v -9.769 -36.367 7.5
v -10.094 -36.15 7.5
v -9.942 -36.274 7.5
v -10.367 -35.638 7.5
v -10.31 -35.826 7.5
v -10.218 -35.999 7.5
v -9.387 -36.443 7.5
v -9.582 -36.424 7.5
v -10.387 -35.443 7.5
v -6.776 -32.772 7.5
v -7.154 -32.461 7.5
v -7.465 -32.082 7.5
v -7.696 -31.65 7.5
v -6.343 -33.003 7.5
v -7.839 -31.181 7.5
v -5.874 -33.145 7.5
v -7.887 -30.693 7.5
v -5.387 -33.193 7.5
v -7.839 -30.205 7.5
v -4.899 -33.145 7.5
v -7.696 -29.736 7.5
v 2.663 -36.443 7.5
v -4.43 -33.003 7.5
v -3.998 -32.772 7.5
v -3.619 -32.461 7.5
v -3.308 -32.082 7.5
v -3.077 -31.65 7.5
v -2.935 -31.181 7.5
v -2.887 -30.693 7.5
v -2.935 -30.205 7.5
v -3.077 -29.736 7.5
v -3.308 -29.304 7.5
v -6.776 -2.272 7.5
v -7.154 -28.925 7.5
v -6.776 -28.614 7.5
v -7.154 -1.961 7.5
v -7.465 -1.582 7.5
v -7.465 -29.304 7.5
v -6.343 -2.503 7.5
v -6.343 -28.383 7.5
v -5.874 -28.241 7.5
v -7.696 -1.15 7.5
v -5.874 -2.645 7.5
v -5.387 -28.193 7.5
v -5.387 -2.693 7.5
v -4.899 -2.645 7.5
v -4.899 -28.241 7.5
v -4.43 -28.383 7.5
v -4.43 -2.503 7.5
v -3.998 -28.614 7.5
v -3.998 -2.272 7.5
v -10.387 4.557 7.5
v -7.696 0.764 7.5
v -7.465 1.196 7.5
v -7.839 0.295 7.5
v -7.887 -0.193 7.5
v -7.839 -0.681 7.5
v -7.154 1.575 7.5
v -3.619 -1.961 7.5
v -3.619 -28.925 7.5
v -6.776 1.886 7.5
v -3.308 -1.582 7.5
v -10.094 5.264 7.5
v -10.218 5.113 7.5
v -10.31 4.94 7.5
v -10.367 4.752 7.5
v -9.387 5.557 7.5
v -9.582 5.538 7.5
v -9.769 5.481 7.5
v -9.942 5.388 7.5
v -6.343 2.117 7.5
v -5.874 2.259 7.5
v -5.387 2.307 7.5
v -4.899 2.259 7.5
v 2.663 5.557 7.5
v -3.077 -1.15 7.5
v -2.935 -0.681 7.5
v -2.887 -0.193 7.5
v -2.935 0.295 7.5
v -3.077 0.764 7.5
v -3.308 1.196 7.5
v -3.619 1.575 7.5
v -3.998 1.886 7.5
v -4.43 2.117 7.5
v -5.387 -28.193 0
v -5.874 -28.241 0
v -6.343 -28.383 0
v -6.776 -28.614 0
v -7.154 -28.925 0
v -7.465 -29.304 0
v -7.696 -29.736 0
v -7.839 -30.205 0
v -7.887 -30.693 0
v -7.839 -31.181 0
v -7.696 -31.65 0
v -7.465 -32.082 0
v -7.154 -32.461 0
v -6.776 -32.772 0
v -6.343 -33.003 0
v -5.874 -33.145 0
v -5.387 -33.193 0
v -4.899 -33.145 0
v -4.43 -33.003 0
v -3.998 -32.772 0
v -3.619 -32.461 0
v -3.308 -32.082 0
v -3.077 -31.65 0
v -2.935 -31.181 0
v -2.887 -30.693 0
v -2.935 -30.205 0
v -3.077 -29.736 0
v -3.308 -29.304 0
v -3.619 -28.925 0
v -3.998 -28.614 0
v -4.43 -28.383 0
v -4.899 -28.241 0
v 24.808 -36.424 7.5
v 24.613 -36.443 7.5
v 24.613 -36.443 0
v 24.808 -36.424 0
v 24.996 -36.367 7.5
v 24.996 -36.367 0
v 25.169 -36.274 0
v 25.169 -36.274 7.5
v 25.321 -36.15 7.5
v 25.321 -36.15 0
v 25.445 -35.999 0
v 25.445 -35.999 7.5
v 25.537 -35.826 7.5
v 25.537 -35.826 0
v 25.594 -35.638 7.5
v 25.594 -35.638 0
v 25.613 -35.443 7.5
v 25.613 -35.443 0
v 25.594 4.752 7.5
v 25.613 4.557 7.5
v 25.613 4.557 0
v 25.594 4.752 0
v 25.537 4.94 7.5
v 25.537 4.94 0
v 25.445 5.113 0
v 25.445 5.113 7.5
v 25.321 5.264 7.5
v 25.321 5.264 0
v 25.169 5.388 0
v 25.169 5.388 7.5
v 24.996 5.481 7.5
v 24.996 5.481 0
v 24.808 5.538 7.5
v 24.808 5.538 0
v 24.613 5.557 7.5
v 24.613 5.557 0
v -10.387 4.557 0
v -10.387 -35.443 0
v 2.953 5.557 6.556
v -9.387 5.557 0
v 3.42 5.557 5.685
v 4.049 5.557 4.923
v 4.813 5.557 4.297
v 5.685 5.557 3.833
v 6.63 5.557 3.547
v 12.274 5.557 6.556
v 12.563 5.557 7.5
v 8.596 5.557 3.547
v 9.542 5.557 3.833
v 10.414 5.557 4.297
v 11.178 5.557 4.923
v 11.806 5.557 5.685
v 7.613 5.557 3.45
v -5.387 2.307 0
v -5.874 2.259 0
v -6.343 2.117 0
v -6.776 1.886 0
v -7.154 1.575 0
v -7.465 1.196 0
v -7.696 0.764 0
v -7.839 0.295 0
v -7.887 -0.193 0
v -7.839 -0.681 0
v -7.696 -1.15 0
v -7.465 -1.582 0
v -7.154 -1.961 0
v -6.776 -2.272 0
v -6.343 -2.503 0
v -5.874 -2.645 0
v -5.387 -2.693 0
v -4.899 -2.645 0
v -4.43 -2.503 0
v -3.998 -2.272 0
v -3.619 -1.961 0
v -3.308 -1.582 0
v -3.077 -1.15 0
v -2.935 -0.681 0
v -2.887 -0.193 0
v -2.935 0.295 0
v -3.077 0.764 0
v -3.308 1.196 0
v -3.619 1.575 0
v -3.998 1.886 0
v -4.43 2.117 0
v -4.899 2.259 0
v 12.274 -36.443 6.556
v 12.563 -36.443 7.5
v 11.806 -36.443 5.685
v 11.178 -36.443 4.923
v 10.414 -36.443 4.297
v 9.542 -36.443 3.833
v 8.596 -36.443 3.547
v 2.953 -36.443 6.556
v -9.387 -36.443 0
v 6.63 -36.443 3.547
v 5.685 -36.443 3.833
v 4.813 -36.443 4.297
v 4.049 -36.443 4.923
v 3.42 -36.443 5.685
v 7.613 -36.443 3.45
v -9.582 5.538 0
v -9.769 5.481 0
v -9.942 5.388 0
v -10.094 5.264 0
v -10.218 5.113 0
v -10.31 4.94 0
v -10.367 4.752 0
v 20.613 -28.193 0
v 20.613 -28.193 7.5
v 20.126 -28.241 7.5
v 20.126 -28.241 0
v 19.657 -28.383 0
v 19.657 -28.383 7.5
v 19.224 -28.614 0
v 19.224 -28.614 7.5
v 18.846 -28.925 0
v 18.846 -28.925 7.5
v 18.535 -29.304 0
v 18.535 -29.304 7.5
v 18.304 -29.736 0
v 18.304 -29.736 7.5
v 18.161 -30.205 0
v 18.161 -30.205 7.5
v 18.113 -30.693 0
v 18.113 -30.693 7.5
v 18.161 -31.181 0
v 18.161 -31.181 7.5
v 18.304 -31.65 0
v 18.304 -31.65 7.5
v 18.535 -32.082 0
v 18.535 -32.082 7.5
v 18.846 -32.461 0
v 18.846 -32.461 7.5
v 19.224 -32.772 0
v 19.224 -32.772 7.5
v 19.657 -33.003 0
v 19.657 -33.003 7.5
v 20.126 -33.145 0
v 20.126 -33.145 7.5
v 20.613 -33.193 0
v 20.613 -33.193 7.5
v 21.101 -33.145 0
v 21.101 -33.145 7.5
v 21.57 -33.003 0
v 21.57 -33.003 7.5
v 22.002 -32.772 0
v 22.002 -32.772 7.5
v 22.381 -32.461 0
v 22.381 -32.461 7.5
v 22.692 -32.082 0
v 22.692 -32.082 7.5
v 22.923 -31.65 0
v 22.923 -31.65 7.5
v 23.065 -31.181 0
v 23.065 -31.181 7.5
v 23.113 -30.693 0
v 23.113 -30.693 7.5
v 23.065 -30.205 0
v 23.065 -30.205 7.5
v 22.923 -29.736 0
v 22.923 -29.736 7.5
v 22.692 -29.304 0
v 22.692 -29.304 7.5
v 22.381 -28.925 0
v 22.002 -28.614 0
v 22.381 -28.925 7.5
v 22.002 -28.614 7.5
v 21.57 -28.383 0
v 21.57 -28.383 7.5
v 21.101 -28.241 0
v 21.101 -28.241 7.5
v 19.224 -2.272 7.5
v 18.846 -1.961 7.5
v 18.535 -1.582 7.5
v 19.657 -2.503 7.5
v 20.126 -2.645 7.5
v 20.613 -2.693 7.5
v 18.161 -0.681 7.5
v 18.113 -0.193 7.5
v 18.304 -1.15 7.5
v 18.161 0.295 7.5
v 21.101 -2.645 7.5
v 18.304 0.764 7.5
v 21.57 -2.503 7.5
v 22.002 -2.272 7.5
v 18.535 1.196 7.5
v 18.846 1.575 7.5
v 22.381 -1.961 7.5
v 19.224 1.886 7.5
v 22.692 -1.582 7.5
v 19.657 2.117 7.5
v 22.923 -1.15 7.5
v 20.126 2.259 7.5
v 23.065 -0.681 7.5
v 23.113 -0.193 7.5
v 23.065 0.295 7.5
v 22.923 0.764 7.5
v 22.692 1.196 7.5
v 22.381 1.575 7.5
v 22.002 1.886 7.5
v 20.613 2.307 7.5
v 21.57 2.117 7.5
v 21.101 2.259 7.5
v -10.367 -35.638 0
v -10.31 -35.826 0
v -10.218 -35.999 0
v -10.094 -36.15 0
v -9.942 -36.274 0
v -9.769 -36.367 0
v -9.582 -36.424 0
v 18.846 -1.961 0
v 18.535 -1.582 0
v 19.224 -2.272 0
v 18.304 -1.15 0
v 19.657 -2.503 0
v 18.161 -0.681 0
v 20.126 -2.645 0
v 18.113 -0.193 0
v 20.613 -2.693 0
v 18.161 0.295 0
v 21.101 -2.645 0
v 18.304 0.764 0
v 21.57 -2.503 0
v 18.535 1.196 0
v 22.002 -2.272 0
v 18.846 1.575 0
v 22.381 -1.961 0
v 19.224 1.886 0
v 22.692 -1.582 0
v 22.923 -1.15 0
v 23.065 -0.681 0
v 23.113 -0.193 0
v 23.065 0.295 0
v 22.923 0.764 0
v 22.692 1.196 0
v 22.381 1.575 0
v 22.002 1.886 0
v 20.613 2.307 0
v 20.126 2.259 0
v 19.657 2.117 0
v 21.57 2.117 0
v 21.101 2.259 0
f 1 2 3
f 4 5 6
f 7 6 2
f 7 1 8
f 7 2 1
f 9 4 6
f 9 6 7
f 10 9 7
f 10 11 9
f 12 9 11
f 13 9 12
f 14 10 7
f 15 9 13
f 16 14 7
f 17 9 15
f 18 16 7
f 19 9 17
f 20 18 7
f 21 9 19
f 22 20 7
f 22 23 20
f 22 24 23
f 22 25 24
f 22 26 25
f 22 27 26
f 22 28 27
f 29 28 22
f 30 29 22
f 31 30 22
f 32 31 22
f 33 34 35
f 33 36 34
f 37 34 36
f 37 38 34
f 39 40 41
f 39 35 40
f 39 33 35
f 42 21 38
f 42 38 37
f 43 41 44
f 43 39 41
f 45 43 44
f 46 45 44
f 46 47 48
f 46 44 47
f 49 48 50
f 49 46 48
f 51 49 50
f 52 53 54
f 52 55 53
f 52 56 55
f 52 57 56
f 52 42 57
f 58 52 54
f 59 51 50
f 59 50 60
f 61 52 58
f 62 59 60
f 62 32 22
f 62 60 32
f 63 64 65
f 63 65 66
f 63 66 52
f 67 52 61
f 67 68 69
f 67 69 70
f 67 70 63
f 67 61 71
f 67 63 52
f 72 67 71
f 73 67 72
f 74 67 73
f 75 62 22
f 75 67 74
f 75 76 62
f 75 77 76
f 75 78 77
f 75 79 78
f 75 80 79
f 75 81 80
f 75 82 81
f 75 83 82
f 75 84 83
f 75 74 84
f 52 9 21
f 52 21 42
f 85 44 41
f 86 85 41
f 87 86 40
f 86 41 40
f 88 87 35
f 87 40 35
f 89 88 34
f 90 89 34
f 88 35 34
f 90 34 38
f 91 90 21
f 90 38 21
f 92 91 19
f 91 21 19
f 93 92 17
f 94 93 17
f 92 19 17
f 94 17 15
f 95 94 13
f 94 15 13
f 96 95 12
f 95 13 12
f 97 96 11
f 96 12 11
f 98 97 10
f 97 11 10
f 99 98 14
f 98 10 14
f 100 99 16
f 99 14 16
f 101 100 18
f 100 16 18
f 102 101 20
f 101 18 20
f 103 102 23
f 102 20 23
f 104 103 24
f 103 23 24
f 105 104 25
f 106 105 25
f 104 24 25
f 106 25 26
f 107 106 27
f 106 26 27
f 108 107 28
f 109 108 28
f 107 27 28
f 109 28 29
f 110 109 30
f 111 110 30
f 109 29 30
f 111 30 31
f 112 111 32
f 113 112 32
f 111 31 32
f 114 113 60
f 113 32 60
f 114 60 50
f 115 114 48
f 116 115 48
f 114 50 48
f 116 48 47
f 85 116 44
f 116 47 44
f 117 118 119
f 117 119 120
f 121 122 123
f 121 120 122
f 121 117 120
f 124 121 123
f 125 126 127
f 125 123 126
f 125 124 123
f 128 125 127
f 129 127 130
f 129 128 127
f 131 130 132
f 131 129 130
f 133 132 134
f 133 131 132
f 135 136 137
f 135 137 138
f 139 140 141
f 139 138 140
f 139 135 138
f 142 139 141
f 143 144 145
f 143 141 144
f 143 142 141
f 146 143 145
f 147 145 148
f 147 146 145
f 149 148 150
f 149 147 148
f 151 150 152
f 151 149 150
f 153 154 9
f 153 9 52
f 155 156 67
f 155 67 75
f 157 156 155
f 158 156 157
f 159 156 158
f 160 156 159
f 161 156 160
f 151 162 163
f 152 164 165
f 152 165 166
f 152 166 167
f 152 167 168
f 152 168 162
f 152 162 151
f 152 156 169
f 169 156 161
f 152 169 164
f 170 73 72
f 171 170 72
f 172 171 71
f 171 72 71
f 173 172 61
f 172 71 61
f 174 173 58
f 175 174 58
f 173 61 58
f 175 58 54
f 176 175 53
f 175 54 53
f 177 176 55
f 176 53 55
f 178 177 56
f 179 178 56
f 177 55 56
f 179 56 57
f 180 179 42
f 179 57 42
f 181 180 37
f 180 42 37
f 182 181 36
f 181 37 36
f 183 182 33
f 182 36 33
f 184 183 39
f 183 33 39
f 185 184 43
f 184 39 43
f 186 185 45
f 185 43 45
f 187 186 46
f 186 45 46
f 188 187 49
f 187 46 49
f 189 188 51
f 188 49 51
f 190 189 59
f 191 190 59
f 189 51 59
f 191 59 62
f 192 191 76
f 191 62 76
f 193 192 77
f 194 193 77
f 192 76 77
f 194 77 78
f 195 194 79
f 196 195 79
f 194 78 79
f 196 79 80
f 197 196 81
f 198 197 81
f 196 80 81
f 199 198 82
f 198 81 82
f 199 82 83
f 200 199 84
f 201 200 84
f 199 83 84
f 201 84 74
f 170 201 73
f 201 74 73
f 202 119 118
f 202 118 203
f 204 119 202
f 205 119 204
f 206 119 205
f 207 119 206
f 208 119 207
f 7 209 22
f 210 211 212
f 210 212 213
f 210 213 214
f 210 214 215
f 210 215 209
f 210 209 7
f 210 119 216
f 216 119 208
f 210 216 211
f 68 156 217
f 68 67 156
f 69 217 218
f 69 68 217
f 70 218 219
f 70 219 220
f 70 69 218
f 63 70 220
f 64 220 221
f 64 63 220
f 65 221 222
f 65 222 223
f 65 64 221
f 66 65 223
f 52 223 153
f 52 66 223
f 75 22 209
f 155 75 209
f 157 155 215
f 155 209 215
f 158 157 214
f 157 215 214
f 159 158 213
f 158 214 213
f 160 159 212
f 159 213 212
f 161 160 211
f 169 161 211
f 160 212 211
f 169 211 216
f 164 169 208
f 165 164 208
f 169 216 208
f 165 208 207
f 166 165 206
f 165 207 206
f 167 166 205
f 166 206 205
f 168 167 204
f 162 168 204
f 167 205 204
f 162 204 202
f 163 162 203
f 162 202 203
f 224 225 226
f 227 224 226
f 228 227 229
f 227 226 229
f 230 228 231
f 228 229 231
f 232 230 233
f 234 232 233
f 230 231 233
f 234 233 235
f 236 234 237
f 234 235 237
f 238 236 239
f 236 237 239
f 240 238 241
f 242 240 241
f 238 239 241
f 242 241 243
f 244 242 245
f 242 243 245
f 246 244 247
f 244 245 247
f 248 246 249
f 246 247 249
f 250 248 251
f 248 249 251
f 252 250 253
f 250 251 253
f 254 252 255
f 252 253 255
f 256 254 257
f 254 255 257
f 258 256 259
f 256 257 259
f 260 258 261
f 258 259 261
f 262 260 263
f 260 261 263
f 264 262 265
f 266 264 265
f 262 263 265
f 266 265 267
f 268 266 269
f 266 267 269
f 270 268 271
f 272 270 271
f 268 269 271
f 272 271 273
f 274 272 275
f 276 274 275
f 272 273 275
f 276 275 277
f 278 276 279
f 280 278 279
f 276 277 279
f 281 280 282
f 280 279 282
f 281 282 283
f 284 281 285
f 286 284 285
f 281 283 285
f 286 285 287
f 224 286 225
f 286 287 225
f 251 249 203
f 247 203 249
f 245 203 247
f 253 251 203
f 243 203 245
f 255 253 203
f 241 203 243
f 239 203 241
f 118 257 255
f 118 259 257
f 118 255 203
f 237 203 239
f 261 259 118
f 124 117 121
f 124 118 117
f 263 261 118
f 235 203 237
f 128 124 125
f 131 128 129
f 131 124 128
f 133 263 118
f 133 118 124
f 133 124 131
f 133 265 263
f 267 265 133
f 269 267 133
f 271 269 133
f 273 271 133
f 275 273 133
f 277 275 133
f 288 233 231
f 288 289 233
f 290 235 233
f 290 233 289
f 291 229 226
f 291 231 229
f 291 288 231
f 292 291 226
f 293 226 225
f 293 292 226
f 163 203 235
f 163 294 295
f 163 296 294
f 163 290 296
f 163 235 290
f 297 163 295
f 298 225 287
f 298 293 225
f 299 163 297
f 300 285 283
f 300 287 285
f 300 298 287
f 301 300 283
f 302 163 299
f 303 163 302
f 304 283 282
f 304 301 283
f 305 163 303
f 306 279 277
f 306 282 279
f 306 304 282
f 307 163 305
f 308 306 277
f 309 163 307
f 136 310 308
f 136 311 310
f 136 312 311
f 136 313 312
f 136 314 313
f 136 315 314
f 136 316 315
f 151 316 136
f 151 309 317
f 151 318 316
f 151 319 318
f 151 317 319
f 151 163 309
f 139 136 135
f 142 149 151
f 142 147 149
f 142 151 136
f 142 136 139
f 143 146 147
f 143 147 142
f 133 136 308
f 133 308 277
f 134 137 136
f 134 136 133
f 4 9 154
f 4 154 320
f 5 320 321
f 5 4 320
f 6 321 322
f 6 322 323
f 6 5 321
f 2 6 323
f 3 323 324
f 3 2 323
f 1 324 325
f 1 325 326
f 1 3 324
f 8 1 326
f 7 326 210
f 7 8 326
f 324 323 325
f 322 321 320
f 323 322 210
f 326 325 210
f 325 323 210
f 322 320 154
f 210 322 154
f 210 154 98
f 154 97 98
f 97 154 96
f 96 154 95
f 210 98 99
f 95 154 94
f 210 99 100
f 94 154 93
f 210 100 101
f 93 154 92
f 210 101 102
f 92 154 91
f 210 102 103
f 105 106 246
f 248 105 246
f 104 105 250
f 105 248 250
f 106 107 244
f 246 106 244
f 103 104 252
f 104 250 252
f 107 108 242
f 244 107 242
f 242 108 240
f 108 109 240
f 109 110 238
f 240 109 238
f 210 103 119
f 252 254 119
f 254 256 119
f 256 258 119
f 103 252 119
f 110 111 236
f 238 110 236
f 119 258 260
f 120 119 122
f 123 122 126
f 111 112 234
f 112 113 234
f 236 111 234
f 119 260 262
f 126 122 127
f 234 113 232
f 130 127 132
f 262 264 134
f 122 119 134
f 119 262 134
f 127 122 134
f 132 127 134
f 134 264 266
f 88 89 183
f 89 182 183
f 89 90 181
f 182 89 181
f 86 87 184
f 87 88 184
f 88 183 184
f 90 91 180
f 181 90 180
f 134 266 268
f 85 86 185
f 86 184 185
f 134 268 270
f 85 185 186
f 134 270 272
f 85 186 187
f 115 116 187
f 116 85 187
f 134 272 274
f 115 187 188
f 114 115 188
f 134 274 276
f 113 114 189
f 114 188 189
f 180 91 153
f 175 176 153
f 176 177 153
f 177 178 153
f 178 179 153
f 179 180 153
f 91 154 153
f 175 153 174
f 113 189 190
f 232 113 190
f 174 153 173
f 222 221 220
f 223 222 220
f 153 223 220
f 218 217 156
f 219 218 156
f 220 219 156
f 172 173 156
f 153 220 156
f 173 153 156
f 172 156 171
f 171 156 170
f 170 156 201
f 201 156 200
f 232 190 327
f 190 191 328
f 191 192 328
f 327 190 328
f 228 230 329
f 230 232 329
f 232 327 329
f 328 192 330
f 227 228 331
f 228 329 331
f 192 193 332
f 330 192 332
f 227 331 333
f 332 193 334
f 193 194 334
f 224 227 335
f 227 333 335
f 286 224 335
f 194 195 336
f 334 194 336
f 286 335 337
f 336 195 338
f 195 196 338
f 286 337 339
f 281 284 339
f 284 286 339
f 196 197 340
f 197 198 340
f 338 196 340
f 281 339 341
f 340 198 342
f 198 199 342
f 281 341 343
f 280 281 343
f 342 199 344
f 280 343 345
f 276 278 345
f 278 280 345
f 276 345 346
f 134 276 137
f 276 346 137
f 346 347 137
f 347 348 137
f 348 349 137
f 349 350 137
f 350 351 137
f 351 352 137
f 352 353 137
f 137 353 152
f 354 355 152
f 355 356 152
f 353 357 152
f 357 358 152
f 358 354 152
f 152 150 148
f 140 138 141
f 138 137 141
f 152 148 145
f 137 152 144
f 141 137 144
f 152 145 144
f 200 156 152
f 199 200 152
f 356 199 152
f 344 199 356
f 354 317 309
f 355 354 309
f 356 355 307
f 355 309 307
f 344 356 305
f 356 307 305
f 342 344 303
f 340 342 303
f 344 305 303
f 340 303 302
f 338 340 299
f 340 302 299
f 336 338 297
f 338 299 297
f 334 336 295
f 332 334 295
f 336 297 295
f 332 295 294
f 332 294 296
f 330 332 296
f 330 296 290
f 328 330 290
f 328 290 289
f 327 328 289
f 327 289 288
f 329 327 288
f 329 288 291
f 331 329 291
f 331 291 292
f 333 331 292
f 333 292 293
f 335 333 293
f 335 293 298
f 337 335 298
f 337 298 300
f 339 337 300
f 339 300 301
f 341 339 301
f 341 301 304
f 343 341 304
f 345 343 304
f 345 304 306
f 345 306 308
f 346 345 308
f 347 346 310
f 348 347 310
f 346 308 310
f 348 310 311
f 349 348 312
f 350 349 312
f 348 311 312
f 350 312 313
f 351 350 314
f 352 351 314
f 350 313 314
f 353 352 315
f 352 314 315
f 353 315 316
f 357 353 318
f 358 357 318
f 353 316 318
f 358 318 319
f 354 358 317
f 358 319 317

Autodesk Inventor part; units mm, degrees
ref_plane "YZ Plane" through (0, 0, 0) normal (1, 0, 0) x (0, 1, 0)
ref_plane "XZ Plane" through (0, 0, 0) normal (0, 1, 0) x (-1, 0, 0)
ref_plane "XY Plane" through (0, 0, 0) normal (0, 0, 1) x (1, 0, 0)
sketch "Szkic1" plane through (0, 0, 0) normal (0, 0, 1) x (1, 0, 0)
  line L0 (-10.3866, 5.557) -> (25.6134, 5.557)
  line L1 (25.6134, 5.557) -> (25.6134, -36.443)
  line L2 (25.6134, -36.443) -> (-10.3866, -36.443)
  line L3 (-10.3866, -36.443) -> (-10.3866, 5.557)
  point P0 (0, 0)
  point P1 (20.6134, -0.193)
  point P2 (20.6134, -30.693)
  point P3 (-5.3866, -0.193)
  point P4 (-5.3866, -30.693)
  dimension "d0" = 36
  dimension "d1" = 42
  dimension "d2" = 5
  dimension "d3" = 5
  dimension "d4" = 5
  dimension "d5" = 5
  dimension "d6" = 5.75
  dimension "d7" = 5.75
  dimension "d8" = 5.75
  dimension "d9" = 5.75
extrude "Wyciągnięcie proste1" add sketch "Szkic1" along normal blind 7.5
hole "Otwór1" at (20.6134, -0.193, 0) at (20.6134, -30.693, 0) at (-5.3866, -0.193, 0) at (-5.3866, -30.693, 0) direction (0, 0, 1) diameter 5 end through all
sketch "Szkic2" plane through (-10.3866, -36.443, 0) normal (0, -1, 0) x (1, 0, 0)
  line L0 (36, 0) -> (0, 0) projected
  line L1 (36, 0) -> (36, 7.5) projected
  line L2 (0, 7.5) -> (36, 7.5) projected
  line L3 (0, 0) -> (0, 7.5) projected
  line L4 (36, 7.5) -> (0, 7.5) projected
  circle A0 centre (18, 8.5) radius 5.05
  point P0 (10.3866, 0)
  dimension "d19" = 36
  dimension "d25" = 8.5
  dimension "d26" = 18
  dimension "d27" = 10.1
  dimension "d28" = 7.5
extrude "Wyciągnięcie proste2" cut sketch "Szkic2" against normal through all contours A0 L2 | L2 A0
fillet "Zaokrąglenie1" radius 1 4 edges at (-10.3866, -36.443, 3.75) (-10.3866, 5.557, 3.75) (25.6134, -36.443, 3.75) (25.6134, 5.557, 3.75)
equation "\"d7\" = d6"
equation "\"d8\" = d7"
equation "\"d9\" = d6"
equation "\"d26\" = 0.5 * d19"
properties part number "3DP_ABS_X_Axis_Linear_Shaft_Clamp_Top"
